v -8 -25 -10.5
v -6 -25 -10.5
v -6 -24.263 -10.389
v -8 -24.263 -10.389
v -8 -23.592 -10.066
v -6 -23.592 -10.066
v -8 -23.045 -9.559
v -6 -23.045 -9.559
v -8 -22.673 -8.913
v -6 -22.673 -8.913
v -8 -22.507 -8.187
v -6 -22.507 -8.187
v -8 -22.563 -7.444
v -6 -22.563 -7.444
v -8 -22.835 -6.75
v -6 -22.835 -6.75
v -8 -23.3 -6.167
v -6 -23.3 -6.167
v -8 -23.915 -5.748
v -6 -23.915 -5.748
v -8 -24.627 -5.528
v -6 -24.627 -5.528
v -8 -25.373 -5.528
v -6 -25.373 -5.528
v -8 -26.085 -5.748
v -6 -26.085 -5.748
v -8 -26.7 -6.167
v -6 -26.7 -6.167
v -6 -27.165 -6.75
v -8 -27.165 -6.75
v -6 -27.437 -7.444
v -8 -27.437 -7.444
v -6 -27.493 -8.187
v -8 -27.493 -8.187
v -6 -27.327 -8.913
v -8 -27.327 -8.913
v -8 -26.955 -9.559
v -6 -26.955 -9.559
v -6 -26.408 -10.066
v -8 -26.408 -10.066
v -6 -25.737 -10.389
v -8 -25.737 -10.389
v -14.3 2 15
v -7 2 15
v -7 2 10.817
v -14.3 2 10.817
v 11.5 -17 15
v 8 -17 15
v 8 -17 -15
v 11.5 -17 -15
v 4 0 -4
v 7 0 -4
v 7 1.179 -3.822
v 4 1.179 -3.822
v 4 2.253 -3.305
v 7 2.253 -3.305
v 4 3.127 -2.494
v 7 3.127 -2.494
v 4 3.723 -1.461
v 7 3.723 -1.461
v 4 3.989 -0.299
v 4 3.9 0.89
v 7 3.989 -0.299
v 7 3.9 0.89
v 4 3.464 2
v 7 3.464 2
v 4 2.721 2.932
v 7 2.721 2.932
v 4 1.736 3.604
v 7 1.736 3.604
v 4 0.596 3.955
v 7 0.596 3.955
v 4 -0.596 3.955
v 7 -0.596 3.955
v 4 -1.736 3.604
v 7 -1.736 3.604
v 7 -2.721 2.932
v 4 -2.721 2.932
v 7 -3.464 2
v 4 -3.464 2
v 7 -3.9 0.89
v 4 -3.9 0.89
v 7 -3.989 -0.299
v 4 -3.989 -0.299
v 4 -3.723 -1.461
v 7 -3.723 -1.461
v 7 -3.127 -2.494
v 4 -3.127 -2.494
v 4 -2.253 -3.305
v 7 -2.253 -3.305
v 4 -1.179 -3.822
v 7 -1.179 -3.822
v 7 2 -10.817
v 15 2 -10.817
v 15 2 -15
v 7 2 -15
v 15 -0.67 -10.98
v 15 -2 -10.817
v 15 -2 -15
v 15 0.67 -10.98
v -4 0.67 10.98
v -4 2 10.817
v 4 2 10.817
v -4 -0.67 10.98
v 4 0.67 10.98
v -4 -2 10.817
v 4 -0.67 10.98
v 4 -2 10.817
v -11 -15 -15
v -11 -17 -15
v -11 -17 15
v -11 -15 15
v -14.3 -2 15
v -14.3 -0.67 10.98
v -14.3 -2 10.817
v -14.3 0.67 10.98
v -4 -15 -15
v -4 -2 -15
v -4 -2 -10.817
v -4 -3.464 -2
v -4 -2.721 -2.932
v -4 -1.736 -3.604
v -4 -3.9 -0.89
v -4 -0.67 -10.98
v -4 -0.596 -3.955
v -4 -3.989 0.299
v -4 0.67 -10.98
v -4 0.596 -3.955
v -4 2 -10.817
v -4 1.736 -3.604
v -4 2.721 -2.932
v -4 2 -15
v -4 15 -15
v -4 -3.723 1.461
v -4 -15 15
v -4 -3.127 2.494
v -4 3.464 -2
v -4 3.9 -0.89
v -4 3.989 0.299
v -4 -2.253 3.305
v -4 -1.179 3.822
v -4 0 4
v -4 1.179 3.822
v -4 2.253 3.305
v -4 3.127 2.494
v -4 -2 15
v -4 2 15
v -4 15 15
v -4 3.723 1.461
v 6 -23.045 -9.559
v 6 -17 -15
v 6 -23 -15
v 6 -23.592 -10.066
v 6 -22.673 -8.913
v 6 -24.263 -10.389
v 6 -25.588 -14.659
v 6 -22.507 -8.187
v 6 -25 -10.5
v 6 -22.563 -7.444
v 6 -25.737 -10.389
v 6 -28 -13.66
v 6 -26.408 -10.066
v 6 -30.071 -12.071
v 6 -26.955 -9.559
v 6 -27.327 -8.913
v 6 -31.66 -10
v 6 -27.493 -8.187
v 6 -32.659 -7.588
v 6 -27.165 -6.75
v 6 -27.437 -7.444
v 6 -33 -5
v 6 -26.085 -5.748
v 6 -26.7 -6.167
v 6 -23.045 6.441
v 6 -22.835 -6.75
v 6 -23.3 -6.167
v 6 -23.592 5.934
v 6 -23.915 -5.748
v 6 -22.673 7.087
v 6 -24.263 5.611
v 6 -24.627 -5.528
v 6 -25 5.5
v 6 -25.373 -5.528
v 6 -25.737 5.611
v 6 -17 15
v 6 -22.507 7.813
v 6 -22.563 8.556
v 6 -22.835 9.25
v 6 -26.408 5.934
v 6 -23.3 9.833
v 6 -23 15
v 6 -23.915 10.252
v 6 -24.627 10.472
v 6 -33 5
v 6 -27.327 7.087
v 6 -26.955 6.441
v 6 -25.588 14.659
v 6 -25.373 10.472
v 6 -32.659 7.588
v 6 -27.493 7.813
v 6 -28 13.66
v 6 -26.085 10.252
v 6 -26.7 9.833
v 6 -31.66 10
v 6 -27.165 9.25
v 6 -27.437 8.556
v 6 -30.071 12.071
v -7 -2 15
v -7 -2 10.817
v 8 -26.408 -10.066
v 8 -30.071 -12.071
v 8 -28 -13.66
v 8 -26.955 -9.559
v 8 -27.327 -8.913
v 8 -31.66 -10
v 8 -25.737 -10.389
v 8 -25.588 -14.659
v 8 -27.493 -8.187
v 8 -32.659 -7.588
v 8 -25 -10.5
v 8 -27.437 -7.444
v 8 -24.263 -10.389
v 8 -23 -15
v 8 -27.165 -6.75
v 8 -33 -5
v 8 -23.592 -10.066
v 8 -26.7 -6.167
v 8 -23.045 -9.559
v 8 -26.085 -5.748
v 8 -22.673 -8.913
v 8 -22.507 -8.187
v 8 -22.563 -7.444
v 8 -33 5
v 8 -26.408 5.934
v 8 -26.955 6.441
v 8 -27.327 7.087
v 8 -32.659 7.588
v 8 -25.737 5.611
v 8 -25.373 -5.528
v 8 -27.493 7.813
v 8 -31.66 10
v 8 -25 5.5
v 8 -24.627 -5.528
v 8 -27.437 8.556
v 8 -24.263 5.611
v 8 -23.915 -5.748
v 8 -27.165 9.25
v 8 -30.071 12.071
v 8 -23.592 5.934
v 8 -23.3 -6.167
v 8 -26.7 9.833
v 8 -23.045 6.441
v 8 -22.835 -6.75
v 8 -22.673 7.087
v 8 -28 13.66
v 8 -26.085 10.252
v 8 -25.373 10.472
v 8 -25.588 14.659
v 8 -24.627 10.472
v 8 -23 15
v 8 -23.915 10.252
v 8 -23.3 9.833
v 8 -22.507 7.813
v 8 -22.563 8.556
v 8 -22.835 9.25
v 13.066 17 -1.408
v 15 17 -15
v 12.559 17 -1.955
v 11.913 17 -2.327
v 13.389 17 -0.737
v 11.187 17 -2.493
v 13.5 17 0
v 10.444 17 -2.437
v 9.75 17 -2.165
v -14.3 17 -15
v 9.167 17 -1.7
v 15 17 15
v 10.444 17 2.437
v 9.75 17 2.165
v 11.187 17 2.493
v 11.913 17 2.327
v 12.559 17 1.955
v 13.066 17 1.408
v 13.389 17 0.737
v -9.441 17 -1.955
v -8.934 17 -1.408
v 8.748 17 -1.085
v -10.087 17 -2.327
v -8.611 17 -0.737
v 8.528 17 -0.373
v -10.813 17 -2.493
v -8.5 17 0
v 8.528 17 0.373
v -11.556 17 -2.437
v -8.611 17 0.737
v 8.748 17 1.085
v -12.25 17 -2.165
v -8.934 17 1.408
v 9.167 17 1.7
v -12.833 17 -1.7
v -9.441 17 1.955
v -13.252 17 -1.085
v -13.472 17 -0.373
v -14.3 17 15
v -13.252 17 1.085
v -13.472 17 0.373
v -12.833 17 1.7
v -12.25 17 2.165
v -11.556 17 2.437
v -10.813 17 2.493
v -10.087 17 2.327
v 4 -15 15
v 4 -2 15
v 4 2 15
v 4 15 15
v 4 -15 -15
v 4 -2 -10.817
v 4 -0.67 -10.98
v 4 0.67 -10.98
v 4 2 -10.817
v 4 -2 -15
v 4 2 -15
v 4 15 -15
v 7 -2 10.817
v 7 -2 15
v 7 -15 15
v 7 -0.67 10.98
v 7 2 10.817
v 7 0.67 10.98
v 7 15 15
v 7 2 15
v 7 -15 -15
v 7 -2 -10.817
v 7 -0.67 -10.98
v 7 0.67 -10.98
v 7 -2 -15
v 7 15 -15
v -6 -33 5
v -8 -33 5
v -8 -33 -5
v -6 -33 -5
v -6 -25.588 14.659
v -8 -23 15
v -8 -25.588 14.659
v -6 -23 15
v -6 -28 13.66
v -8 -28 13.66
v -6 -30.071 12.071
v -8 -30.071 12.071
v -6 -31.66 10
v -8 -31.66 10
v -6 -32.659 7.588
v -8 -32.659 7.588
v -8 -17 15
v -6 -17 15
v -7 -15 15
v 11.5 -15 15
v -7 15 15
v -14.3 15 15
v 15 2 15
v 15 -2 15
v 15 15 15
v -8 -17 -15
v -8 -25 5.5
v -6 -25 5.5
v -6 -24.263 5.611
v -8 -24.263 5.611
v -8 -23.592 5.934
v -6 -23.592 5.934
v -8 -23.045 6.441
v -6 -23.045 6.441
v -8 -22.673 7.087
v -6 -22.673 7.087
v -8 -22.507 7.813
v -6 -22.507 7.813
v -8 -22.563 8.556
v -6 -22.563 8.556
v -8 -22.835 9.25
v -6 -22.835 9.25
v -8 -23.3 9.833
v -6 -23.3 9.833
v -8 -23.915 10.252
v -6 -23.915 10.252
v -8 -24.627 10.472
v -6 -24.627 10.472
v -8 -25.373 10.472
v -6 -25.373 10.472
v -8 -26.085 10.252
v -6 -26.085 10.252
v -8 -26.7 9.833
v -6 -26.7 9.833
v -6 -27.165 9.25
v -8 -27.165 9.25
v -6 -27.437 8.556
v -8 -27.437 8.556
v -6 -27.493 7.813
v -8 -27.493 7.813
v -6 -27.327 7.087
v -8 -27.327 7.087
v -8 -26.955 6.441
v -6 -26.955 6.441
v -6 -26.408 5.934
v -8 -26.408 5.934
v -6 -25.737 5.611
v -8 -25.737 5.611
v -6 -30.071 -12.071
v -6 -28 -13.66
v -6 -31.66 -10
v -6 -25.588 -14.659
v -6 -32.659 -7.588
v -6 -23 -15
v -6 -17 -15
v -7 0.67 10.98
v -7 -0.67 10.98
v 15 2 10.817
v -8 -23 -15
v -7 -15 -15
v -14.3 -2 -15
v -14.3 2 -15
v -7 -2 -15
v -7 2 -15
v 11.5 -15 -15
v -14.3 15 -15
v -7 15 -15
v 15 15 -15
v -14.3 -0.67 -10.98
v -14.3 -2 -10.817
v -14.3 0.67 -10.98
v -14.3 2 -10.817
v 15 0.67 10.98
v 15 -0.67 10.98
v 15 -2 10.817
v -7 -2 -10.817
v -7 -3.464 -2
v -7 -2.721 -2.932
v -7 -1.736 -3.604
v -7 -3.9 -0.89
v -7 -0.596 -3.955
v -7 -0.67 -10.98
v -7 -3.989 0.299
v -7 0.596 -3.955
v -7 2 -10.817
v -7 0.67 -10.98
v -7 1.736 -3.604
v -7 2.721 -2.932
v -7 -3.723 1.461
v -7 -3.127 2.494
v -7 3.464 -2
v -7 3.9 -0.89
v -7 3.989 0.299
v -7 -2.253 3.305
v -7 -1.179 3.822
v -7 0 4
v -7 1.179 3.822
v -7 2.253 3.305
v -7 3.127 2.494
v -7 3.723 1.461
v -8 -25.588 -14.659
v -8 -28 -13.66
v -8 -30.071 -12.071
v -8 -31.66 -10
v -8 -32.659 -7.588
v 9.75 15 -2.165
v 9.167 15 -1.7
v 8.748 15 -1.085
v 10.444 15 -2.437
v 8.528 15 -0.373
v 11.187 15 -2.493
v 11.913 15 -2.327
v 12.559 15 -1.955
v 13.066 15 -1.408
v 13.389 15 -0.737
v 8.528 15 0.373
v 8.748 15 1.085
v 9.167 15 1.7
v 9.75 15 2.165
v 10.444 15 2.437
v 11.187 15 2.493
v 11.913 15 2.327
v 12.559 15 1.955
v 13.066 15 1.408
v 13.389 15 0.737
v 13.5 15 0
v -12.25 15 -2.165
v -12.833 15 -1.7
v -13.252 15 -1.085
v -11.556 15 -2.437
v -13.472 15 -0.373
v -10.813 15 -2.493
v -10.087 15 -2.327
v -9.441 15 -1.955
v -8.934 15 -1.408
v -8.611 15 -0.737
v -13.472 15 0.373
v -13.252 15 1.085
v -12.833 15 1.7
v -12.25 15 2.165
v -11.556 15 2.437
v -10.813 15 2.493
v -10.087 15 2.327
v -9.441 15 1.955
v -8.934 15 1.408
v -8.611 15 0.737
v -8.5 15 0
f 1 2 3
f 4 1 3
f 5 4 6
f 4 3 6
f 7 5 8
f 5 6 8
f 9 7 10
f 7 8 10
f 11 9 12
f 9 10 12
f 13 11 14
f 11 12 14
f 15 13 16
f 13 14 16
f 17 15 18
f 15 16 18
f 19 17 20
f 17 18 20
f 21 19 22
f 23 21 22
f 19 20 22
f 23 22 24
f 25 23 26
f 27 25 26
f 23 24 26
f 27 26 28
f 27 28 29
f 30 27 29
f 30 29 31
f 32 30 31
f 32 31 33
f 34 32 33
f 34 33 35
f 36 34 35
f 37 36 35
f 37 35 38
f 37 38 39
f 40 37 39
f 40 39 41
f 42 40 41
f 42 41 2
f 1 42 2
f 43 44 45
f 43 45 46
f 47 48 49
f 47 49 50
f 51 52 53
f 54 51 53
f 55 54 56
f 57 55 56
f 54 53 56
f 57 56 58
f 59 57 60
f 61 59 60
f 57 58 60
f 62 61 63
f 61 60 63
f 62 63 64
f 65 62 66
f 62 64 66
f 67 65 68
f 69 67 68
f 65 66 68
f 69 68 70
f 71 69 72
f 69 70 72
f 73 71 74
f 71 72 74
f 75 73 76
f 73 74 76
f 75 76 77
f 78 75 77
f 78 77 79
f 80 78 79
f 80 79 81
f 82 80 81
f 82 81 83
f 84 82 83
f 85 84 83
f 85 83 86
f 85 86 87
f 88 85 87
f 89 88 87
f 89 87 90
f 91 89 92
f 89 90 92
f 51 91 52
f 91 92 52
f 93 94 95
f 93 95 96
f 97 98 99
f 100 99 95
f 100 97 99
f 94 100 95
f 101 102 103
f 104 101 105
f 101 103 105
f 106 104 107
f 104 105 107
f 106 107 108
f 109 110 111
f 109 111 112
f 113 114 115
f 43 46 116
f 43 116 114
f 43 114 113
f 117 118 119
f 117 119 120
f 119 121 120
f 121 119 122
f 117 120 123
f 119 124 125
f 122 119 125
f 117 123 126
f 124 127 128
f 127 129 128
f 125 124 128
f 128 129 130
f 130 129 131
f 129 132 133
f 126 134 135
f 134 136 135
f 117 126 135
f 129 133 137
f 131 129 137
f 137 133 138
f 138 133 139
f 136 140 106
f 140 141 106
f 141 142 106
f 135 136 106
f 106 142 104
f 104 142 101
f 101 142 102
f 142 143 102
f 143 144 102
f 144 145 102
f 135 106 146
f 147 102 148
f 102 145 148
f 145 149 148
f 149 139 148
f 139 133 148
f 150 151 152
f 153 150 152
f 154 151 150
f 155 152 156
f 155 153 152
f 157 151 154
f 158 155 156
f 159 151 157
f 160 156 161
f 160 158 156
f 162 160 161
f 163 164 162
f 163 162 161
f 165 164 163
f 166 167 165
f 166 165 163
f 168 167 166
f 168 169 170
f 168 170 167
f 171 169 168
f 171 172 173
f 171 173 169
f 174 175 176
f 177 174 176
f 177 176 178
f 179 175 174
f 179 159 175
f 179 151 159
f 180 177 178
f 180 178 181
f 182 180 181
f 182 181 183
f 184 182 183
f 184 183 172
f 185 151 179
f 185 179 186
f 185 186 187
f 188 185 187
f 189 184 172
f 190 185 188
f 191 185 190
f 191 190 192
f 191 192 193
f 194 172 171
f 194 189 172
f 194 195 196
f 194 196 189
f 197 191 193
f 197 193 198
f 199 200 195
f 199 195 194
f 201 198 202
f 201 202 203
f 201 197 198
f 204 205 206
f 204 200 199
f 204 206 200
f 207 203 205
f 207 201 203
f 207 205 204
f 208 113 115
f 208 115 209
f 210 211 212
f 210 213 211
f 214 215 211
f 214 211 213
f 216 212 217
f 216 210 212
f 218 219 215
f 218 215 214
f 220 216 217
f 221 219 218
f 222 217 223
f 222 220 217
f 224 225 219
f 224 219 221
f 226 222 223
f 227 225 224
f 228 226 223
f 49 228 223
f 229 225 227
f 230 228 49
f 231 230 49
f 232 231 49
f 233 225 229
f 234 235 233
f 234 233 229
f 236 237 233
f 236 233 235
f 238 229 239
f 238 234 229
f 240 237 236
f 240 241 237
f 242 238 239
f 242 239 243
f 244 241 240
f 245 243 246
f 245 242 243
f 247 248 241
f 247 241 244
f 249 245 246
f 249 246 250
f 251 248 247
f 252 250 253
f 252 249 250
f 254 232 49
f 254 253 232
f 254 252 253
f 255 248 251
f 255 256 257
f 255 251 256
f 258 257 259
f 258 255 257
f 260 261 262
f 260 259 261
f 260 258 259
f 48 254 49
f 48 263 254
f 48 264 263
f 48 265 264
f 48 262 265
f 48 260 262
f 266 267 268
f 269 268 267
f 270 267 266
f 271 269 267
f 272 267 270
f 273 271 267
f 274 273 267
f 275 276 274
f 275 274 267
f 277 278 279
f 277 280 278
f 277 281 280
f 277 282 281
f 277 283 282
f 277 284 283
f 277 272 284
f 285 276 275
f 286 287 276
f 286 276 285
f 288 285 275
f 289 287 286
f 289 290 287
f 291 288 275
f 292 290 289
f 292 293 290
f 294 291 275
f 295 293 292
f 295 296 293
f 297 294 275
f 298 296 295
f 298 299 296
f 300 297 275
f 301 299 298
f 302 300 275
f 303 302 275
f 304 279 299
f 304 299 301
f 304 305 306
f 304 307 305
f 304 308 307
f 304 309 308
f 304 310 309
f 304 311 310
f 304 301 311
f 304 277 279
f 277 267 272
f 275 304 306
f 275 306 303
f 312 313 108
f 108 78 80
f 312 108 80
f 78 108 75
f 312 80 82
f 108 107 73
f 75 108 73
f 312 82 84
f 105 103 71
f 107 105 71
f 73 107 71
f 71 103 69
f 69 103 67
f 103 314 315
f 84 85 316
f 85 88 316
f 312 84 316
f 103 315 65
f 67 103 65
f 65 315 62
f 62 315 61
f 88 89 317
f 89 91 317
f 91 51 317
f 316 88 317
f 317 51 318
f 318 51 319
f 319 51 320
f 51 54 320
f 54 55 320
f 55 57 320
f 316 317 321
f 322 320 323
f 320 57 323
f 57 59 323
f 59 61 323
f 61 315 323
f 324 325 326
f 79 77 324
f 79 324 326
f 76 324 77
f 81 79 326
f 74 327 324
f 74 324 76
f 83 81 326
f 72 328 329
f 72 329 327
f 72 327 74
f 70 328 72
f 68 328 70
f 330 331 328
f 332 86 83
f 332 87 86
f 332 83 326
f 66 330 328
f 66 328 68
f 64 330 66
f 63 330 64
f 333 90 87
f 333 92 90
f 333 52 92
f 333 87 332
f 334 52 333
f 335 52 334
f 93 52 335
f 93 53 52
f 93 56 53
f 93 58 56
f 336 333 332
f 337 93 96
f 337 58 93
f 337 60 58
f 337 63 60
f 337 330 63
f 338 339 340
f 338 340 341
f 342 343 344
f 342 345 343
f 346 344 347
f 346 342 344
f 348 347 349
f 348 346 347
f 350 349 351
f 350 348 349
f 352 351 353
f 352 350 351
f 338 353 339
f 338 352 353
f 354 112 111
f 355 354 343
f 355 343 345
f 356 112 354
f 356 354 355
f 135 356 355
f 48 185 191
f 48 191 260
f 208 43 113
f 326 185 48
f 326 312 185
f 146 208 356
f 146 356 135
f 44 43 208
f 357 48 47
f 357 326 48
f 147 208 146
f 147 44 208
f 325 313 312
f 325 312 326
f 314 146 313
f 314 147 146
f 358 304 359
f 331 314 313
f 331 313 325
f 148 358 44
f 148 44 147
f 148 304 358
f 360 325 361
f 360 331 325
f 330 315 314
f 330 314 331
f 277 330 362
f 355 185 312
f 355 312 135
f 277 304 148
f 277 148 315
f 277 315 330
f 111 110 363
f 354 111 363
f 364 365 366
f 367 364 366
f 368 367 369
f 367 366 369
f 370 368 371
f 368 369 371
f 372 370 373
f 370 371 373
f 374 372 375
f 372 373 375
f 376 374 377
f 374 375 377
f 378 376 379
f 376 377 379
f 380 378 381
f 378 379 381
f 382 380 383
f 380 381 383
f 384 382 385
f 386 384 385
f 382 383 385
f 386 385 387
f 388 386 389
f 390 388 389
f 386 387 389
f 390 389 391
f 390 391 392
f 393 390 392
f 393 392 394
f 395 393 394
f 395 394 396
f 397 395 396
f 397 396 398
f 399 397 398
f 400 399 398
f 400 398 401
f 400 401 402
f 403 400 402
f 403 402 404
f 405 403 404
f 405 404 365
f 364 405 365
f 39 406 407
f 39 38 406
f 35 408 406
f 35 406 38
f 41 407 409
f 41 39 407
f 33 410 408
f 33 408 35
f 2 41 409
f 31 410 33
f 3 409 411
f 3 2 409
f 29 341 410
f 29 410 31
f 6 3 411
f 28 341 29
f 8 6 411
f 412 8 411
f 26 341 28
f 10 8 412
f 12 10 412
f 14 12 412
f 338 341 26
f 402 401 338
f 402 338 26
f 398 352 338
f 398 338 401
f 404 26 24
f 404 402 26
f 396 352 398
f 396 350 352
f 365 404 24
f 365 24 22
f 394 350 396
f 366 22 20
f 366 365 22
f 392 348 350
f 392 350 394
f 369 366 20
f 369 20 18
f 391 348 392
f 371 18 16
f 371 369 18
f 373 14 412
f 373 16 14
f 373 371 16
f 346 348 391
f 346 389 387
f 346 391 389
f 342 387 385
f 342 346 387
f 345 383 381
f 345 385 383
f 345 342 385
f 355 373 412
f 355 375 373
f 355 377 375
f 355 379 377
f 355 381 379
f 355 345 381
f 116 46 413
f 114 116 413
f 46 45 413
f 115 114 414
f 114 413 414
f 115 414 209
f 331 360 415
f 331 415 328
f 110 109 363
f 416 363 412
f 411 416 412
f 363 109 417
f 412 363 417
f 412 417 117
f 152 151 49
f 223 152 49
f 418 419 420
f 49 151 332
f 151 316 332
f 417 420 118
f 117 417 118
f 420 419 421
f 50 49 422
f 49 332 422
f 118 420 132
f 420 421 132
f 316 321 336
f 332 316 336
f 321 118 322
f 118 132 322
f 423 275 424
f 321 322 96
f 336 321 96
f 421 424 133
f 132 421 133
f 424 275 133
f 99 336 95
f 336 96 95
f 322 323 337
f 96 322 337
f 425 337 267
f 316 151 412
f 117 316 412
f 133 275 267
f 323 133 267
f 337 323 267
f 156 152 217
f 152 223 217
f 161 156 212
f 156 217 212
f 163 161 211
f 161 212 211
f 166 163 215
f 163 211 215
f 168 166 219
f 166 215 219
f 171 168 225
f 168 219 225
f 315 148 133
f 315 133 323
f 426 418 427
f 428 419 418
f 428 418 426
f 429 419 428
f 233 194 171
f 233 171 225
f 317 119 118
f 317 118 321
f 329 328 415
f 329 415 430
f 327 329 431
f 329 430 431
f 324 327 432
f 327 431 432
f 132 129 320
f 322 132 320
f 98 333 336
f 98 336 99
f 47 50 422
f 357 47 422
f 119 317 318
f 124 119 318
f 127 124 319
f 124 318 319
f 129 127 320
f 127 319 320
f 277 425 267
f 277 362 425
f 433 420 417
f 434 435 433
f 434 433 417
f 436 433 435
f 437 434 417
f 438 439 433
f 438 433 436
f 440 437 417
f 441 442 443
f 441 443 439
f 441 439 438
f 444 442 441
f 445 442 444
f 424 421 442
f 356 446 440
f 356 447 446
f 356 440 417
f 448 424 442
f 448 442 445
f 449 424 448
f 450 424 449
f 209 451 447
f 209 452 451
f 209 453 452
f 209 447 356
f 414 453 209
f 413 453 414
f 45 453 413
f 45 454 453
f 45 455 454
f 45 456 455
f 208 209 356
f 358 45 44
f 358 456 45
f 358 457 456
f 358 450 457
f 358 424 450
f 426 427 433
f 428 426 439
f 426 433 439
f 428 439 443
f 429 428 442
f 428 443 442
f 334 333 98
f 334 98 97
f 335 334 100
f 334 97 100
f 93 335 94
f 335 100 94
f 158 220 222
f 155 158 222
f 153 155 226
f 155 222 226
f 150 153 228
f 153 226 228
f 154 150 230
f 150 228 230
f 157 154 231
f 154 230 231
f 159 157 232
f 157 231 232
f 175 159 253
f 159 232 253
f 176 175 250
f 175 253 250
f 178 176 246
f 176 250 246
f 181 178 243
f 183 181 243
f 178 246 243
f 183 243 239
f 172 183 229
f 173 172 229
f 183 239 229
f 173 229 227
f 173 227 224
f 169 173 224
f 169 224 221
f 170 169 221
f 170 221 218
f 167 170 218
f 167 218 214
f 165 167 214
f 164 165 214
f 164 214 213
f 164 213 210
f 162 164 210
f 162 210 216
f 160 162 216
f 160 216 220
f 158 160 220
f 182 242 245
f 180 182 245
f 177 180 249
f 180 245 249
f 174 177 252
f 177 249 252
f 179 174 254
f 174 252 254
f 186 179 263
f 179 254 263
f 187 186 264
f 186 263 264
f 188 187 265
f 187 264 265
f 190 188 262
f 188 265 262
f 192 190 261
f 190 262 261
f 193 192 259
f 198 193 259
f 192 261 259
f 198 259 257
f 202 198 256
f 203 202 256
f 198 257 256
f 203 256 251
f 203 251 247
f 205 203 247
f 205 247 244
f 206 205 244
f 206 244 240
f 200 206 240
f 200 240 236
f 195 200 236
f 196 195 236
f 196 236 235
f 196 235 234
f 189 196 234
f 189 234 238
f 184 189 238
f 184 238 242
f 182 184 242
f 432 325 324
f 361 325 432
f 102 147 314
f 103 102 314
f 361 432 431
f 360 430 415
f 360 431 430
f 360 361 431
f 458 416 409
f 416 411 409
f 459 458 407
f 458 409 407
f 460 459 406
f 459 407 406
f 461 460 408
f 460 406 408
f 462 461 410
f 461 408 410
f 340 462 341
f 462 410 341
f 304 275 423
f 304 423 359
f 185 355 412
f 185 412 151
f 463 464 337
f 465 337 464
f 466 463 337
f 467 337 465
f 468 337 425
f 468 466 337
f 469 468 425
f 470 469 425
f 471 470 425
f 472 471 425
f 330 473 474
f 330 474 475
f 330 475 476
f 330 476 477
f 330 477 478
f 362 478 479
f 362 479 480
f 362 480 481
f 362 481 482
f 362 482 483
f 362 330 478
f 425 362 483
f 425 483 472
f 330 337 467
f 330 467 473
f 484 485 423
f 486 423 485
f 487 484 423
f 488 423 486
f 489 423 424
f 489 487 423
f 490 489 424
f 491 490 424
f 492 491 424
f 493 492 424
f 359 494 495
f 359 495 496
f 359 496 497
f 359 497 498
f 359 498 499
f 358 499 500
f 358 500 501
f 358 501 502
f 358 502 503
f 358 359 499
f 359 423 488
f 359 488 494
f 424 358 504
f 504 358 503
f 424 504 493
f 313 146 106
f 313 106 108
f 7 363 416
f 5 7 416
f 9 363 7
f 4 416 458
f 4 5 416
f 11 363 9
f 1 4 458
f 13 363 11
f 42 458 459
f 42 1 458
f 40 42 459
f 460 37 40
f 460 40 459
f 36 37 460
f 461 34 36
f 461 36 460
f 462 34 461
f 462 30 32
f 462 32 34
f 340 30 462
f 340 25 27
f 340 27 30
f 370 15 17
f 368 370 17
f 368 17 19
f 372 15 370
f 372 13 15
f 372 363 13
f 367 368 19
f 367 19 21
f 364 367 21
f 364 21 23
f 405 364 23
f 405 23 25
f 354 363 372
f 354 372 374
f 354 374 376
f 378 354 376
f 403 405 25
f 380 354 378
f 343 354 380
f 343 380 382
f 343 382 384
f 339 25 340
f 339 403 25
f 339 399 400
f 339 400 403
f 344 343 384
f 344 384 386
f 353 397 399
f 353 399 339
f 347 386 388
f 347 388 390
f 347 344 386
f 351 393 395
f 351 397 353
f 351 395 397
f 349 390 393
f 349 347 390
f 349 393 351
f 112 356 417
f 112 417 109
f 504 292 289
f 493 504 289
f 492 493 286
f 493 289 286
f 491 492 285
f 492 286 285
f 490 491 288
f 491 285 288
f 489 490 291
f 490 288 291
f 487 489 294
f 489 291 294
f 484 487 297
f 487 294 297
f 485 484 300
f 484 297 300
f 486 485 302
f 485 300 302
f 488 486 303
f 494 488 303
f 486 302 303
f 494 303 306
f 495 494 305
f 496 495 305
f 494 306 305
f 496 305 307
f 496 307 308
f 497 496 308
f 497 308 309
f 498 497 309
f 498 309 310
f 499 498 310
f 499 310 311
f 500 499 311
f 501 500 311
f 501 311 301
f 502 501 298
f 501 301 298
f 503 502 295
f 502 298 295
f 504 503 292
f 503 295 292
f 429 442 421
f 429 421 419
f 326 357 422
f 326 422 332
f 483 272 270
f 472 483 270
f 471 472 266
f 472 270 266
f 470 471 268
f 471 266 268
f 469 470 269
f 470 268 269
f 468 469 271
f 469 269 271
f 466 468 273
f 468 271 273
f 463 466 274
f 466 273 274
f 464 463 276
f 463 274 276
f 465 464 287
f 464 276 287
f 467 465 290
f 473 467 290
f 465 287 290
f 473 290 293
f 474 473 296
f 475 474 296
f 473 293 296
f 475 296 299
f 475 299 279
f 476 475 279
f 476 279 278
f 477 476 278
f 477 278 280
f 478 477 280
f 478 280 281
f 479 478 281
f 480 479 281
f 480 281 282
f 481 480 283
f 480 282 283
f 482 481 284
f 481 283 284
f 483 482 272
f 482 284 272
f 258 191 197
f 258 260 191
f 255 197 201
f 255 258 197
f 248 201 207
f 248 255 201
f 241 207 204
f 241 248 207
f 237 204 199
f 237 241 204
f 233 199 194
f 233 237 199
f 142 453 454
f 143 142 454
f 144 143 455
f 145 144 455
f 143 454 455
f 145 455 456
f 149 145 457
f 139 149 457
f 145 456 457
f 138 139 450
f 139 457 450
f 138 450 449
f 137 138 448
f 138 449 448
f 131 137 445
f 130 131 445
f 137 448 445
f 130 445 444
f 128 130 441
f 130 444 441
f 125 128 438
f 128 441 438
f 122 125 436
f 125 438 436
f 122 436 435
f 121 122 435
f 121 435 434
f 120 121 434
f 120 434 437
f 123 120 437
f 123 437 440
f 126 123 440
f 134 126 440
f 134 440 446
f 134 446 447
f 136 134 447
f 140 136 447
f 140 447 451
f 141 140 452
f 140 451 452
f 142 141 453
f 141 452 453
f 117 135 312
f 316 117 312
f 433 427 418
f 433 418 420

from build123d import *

# Parameters (mm, degrees)
CROQUIS1_W              = 8
CROQUIS1_H              = 13
SALIENTE_EXTRUIR1_DEPTH = 15
CROQUIS3_R              = 11
CORTAR_EXTRUIR1_DEPTH   = 15
CROQUIS4_R              = 2.5
CORTAR_EXTRUIR2_DEPTH   = 30
REDONDEO1_R             = 10
CROQUIS5_R              = 2.5
CORTAR_EXTRUIR3_DEPTH   = 2
SKETCH2_R               = 11
SKETCH2_R_2             = 4
BOSS_EXTRUDE1_DEPTH     = 3
SKETCH3_R               = 11
SKETCH3_R_2             = 4
BOSS_EXTRUDE2_DEPTH     = 3
SKETCH4_W               = 3.5
SKETCH4_H               = 2
SKETCH4_W_2             = 4
CUT_EXTRUDE1_DEPTH      = 31
SKETCH5_W               = 30
SKETCH5_H               = 19
CUT_EXTRUDE2_DEPTH      = 0.7


with BuildPart() as part:
    # Croquis1 → Saliente-Extruir1 (new body, symmetric)
    with BuildSketch(Plane.XY):
        Polygon((-15, -2), (-7, -2), (-7, -15), (-15, -15), (-15, -17), (-8, -17), (-8, -33), (-6, -33), (-6, -17), (6, -17), (6, -33), (8, -33), (8, -17), (15, -17), (15, -15), (7, -15), (7, -2), (15, -2), (15, 2), (7, 2), (7, 15), (15, 15), (15, 17), (-15, 17), (-15, 15), (-7, 15), (-7, 2), (-15, 2), align=None)
        with Locations((0, 8.5)):
            Rectangle(CROQUIS1_W, CROQUIS1_H, mode=Mode.SUBTRACT)
        with Locations((0, -8.5)):
            Rectangle(CROQUIS1_W, CROQUIS1_H, mode=Mode.SUBTRACT)
    extrude(amount=SALIENTE_EXTRUIR1_DEPTH, both=True)

    # Croquis3 → Cortar-Extruir1 (cut, symmetric)
    with BuildSketch(Plane(origin=(0, 0, 0), x_dir=(0, 0, -1), z_dir=(1, 0, 0))):
        Circle(CROQUIS3_R)
    extrude(amount=CORTAR_EXTRUIR1_DEPTH, both=True, mode=Mode.SUBTRACT)

    # Croquis4 → Cortar-Extruir2 (cut)
    with BuildSketch(Plane(origin=(8, 0, 0), x_dir=(0, 0, -1), z_dir=(1, 0, 0))):
        with Locations((-8, -25)):
            Circle(CROQUIS4_R)
        with Locations((8, -25)):
            Circle(CROQUIS4_R)
    extrude(amount=-CORTAR_EXTRUIR2_DEPTH, mode=Mode.SUBTRACT)

    # Redondeo1
    redondeo1_edges = [part.edges().sort_by_distance(p)[0] for p in [
        (7, -33, -15),
        (-7, -33, -15),
        (-7, -33, 15),
        (7, -33, 15),
    ]]
    fillet(redondeo1_edges, radius=REDONDEO1_R)

    # Croquis5 → Cortar-Extruir3 (cut)
    with BuildSketch(Plane(origin=(0, 17, 0), x_dir=(1, 0, 0), z_dir=(0, 1, 0))):
        with Locations((-11, 0)):
            Circle(CROQUIS5_R)
        with Locations((11, 0)):
            Circle(CROQUIS5_R)
    extrude(amount=-CORTAR_EXTRUIR3_DEPTH, mode=Mode.SUBTRACT)

    # Sketch2 → Boss-Extrude1 (add)
    with BuildSketch(Plane(origin=(7, 0, 0), x_dir=(0, 0, -1), z_dir=(1, 0, 0))):
        Circle(SKETCH2_R)
        Circle(SKETCH2_R_2, mode=Mode.SUBTRACT)
    extrude(amount=-BOSS_EXTRUDE1_DEPTH)

    # Sketch3 → Boss-Extrude2 (add)
    with BuildSketch(Plane.ZY.offset(7)):
        Circle(SKETCH3_R)
        Circle(SKETCH3_R_2, mode=Mode.SUBTRACT)
    extrude(amount=-BOSS_EXTRUDE2_DEPTH)

    # Sketch4 → Cut-Extrude1 (cut, through all)
    with BuildSketch(Plane(origin=(0, 0, -15), x_dir=(-1, 0, 0), z_dir=(0, 0, -1))):
        with Locations((-13.25, -16)):
            Rectangle(SKETCH4_W, SKETCH4_H)
        with Locations((13, -16)):
            Rectangle(SKETCH4_W_2, SKETCH4_H)
    extrude(amount=-CUT_EXTRUDE1_DEPTH, mode=Mode.SUBTRACT)

    # Sketch5 → Cut-Extrude2 (cut)
    with BuildSketch(Plane.ZY.offset(15)):
        with Locations((0, 7.5)):
            Rectangle(SKETCH5_W, SKETCH5_H)
    extrude(amount=-CUT_EXTRUDE2_DEPTH, mode=Mode.SUBTRACT)


solid = part.part
